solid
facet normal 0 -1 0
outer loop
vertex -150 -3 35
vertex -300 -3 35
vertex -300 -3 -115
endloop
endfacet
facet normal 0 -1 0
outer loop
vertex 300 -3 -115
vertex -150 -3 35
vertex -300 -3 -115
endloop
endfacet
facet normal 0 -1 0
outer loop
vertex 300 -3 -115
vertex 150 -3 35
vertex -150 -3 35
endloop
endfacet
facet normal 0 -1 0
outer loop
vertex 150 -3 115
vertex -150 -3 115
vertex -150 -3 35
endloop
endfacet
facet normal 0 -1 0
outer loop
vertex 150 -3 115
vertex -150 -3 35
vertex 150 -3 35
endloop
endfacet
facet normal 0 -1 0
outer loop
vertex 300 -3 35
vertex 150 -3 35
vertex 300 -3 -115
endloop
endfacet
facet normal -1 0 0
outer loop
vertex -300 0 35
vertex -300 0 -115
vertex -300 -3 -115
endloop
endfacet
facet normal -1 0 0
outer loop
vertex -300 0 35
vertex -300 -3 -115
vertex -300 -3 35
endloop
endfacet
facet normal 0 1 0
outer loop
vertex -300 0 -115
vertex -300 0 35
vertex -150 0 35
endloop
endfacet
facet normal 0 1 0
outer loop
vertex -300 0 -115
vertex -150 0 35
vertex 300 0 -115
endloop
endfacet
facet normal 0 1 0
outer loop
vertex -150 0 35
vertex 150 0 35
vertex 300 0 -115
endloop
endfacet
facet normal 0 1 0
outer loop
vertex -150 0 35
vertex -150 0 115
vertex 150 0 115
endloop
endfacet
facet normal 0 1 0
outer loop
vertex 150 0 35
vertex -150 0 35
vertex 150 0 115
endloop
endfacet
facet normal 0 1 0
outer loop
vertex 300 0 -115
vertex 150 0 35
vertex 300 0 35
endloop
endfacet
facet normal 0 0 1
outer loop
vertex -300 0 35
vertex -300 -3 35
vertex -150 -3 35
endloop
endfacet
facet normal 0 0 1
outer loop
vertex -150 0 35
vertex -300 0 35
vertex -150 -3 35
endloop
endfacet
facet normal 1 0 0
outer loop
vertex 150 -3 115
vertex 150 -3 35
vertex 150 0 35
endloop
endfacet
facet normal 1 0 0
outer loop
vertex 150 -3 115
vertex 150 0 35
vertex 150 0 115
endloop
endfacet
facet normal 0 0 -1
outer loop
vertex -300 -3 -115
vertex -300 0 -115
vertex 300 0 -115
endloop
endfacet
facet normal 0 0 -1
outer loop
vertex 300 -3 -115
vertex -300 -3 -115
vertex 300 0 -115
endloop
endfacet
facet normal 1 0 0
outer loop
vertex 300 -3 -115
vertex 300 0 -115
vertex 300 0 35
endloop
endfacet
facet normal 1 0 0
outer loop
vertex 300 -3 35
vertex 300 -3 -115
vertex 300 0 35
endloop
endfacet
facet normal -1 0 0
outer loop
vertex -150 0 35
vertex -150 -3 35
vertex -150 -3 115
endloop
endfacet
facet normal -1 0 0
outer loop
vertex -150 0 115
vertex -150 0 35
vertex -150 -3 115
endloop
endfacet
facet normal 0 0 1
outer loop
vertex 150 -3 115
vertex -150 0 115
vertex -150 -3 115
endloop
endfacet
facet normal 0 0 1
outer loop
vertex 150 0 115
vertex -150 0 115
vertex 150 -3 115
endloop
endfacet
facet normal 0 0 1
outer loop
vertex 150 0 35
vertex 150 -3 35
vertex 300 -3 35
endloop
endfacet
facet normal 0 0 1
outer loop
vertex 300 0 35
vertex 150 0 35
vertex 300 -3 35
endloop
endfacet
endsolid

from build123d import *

# Parameters (mm, degrees)
F0_W     = 600
F0_H     = 230
F1_DEPTH = 3
F2_W     = 150
F2_H     = 80
F3_DEPTH = 3.001
F4_W     = 150
F4_H     = 80
F5_DEPTH = 3.001


with BuildPart() as f1:
    # F0 (on Front) → F1 (new body)
    with BuildSketch(Plane.XZ):
        Rectangle(F0_W, F0_H)
    extrude(amount=F1_DEPTH)

    # F2 (on face) → F3 (cut, through all)
    with BuildSketch(Plane.XZ.offset(3)):
        with Locations((-225, 75)):
            Rectangle(F2_W, F2_H)
    extrude(amount=-F3_DEPTH, mode=Mode.SUBTRACT)

    # F4 (on face) → F5 (cut, through all)
    with BuildSketch(Plane.XZ.offset(3)):
        with Locations((225, 75)):
            Rectangle(F4_W, F4_H)
    extrude(amount=-F5_DEPTH, mode=Mode.SUBTRACT)


solid = f1.part
